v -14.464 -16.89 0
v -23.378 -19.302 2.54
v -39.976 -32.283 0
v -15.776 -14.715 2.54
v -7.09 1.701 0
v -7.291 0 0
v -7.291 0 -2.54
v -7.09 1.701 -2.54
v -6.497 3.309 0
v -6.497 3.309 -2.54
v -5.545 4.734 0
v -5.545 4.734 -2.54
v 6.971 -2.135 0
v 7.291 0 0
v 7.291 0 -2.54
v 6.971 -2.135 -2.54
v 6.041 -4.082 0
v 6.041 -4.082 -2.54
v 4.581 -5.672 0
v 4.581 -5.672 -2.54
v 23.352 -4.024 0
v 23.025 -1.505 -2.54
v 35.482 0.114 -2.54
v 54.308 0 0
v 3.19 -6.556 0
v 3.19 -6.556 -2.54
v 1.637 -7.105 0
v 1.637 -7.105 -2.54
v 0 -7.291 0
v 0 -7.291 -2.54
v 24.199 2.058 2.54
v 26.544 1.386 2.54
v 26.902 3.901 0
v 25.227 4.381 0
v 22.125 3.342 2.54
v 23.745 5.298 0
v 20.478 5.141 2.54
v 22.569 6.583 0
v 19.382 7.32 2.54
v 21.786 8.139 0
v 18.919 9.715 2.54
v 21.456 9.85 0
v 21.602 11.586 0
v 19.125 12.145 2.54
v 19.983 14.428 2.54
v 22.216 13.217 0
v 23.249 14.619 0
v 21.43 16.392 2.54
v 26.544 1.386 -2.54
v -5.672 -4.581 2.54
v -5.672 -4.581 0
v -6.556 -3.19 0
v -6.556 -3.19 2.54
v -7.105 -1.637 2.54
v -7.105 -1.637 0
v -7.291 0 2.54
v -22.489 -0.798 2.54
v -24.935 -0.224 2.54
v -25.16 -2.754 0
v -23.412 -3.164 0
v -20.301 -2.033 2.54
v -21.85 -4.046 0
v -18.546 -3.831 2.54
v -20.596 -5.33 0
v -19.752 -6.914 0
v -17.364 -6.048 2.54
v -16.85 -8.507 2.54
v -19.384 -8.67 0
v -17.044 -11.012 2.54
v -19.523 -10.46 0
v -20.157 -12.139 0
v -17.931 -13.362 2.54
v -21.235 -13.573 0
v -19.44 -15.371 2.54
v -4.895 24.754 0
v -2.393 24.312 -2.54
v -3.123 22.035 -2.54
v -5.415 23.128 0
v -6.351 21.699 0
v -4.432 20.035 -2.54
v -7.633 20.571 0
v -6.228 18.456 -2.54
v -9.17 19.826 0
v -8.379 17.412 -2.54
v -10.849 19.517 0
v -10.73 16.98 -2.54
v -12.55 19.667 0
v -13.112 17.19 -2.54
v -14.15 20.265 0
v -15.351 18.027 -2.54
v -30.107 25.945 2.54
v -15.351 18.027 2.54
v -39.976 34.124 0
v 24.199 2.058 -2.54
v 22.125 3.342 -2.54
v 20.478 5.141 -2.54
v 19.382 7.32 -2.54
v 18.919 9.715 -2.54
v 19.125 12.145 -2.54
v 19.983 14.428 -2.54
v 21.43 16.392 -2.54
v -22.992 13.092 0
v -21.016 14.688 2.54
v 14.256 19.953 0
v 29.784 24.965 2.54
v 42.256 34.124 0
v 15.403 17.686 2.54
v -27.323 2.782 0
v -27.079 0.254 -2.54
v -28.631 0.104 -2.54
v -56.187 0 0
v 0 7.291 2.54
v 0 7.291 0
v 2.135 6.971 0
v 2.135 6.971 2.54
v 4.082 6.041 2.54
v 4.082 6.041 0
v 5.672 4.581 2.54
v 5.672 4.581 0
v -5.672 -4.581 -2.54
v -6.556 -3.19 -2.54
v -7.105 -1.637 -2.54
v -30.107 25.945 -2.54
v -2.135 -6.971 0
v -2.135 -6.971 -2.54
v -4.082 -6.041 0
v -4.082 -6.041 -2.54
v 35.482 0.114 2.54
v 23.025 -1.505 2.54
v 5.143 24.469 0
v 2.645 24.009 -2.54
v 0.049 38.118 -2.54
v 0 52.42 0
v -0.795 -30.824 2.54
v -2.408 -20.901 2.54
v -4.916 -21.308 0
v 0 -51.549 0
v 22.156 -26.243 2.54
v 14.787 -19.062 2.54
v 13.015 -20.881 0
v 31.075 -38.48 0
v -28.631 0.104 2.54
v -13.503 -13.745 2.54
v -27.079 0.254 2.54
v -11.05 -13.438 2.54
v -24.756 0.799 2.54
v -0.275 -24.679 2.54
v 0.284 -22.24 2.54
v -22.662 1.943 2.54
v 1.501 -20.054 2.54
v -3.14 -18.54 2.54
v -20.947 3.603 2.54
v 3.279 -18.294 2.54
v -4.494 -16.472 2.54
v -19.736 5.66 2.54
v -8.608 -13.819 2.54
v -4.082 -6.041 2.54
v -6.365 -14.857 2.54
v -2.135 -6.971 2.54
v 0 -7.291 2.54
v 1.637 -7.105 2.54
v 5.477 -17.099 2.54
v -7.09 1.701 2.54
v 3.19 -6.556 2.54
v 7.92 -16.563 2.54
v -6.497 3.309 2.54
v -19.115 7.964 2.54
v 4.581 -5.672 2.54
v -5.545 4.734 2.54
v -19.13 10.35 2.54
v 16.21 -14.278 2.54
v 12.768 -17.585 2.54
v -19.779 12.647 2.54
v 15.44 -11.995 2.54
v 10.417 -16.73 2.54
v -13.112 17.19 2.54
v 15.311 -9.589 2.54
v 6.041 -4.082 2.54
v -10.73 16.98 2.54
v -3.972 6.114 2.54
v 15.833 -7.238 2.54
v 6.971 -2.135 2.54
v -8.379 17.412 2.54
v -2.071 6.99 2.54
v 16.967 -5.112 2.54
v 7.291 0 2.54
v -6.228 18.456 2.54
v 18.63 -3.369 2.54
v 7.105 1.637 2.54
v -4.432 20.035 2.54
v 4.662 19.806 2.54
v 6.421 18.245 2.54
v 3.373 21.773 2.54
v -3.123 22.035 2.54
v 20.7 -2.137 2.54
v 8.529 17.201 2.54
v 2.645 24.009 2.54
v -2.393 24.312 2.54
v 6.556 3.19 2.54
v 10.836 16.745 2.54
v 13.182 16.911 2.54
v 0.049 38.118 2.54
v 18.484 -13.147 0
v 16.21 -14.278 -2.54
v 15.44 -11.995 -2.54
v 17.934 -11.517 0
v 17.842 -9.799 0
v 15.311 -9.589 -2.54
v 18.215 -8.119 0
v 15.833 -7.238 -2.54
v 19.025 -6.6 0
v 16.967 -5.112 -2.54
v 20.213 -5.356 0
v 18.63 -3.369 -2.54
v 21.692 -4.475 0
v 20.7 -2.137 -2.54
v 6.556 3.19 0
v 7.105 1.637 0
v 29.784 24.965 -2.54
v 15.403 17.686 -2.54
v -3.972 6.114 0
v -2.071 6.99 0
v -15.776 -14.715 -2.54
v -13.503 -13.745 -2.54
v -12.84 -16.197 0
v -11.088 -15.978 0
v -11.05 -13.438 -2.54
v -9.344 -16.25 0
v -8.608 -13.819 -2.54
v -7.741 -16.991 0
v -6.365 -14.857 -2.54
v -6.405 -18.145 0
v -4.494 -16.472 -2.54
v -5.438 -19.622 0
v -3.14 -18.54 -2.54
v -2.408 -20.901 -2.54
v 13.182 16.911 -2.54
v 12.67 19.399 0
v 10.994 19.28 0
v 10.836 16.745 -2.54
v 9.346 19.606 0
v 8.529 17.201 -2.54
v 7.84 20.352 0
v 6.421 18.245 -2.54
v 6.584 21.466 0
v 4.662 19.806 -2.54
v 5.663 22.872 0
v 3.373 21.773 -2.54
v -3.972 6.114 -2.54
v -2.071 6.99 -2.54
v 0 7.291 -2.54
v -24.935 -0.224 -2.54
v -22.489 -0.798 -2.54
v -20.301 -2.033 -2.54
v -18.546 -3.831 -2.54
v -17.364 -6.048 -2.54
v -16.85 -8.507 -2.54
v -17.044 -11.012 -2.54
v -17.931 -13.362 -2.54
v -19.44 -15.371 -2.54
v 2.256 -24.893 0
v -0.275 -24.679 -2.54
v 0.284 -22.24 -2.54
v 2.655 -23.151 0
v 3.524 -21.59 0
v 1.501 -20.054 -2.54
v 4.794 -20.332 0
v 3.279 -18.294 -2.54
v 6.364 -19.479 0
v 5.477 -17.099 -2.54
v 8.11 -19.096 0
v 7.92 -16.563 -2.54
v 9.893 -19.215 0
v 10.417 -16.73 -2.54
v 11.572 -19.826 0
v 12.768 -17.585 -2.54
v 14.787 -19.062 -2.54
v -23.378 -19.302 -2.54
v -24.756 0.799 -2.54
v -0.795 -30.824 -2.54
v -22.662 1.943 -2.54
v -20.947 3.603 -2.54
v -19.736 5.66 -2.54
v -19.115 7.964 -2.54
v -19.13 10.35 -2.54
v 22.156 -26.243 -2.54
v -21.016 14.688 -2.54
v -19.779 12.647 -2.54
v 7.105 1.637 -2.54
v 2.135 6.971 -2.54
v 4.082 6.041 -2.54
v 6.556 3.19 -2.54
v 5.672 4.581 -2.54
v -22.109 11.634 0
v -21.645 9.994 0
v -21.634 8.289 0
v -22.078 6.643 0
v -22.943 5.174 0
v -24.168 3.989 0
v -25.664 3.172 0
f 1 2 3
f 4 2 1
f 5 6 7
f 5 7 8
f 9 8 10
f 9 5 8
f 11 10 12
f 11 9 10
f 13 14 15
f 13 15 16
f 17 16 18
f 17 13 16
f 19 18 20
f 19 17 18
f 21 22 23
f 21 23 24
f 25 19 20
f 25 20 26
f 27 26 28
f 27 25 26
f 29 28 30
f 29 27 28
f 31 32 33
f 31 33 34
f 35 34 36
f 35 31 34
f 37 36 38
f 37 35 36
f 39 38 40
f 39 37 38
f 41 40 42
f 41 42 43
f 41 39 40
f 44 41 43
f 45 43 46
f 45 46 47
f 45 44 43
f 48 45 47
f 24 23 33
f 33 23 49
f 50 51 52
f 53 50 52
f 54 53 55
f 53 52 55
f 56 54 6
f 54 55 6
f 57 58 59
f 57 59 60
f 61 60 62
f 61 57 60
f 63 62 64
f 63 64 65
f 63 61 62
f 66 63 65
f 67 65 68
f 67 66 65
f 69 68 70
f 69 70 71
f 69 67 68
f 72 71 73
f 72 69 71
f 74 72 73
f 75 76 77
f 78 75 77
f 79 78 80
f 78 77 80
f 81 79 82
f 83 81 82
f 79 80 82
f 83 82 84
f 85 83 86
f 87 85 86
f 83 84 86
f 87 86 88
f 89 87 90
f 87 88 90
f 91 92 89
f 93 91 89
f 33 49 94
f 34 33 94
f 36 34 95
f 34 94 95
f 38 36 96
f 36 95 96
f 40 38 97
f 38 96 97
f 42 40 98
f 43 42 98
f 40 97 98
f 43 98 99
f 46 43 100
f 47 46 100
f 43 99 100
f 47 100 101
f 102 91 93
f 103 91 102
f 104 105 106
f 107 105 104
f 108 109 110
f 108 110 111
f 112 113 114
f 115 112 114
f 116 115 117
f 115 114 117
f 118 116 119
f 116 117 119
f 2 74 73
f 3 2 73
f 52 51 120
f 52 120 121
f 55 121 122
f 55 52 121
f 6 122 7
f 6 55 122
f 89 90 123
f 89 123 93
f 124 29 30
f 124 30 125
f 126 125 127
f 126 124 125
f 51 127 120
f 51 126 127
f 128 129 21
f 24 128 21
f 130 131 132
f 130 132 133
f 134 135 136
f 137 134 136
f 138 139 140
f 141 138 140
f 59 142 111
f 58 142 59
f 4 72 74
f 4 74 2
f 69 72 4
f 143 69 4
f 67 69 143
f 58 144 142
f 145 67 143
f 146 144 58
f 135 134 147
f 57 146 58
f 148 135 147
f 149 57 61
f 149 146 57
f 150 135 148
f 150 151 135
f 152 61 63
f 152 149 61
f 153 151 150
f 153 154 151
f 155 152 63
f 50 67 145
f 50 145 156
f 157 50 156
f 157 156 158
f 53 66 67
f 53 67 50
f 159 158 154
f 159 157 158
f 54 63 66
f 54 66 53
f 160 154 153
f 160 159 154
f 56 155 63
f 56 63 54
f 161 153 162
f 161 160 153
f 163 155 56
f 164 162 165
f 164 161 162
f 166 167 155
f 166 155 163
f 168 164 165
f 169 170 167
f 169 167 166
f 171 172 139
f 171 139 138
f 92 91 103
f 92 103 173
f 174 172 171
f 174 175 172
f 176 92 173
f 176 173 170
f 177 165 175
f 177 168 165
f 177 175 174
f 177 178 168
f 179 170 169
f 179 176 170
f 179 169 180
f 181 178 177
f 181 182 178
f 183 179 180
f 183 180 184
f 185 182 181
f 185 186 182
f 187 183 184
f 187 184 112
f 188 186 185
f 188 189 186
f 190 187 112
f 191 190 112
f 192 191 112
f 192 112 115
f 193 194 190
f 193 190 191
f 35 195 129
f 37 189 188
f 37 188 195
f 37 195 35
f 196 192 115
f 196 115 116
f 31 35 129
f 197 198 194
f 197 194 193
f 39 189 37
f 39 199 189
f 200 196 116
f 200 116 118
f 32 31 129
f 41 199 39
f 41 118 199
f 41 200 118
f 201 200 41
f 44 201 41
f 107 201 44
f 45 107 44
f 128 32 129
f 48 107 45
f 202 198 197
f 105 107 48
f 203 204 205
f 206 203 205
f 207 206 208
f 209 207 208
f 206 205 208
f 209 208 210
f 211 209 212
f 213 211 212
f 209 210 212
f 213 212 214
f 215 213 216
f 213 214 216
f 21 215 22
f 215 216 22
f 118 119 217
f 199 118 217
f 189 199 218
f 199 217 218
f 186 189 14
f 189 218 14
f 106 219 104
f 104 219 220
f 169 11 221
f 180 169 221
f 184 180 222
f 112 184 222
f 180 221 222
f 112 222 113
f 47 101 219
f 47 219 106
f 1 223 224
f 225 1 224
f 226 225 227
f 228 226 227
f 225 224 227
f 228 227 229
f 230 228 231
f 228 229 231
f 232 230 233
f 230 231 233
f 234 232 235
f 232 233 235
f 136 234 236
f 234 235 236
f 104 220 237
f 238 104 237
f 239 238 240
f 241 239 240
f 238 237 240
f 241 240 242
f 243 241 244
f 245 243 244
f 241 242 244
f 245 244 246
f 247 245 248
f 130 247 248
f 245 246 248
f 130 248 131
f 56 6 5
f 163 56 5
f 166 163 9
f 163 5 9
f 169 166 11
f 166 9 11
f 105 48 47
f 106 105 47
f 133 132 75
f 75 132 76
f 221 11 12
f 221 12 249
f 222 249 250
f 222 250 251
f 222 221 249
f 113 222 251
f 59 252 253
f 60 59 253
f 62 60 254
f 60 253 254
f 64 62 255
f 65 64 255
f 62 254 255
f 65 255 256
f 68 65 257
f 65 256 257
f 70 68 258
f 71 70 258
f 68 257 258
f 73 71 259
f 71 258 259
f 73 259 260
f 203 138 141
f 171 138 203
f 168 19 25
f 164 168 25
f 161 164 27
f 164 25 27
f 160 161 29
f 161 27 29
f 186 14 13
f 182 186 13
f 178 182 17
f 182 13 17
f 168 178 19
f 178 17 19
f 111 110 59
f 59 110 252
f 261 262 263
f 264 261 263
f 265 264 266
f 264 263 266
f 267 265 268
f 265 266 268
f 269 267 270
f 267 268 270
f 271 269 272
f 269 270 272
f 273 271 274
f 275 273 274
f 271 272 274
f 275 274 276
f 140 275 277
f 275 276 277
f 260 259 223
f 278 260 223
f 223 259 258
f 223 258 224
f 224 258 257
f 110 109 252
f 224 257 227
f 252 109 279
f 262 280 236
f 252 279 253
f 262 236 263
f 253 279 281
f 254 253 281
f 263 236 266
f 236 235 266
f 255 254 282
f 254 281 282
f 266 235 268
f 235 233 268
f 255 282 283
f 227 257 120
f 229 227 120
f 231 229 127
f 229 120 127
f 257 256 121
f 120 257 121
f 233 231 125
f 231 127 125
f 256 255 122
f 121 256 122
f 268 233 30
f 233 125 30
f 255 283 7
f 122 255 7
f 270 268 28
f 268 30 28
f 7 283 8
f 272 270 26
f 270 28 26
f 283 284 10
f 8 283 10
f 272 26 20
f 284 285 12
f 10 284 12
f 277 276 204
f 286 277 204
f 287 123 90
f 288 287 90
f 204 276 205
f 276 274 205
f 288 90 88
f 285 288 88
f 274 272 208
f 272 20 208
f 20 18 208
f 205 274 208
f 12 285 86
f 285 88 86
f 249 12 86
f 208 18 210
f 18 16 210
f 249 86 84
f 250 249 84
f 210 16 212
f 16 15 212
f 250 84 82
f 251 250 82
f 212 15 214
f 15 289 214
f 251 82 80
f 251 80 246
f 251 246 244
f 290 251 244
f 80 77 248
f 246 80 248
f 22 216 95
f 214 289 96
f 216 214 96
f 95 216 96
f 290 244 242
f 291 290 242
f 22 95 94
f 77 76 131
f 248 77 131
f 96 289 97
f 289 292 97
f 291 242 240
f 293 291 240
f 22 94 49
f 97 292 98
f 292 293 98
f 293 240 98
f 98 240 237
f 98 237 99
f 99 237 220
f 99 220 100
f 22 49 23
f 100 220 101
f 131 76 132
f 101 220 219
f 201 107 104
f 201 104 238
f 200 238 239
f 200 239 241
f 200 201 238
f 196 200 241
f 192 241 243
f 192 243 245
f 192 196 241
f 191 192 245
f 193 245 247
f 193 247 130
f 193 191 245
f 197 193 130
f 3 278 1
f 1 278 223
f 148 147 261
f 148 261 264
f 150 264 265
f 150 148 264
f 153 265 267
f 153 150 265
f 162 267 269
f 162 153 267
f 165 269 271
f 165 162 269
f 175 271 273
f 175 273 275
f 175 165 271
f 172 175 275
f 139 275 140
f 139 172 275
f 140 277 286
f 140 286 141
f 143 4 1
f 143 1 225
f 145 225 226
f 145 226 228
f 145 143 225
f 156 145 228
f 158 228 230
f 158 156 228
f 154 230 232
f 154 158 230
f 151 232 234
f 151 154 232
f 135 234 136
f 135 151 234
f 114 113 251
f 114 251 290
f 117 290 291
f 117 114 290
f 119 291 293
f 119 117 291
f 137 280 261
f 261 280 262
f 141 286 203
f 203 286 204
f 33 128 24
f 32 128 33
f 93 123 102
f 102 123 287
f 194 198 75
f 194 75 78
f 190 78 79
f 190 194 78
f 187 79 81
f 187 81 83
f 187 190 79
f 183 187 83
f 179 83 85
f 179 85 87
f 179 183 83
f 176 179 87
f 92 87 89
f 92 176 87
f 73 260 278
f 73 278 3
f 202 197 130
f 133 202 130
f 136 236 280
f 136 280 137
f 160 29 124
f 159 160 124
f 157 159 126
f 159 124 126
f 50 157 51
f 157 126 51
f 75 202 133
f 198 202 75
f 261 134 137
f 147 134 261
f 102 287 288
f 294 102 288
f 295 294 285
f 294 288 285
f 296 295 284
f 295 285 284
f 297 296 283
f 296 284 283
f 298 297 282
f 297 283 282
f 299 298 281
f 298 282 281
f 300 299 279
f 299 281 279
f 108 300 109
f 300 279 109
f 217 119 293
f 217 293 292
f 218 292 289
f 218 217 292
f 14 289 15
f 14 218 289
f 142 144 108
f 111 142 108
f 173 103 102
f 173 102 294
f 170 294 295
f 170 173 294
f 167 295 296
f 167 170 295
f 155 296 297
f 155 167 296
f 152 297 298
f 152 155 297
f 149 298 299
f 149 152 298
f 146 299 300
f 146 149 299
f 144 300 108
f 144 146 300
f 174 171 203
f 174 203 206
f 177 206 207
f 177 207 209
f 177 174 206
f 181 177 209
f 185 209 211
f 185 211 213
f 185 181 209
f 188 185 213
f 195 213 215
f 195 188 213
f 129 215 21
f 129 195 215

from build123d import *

# Parameters (mm, degrees)
F1_DEPTH = 2.54
F2_SIZE  = 2.53999


# Not quite as in the source:
# - a fillet or chamfer is up to 0.001 mm smaller than in the source, because OpenCascade refuses the exact size


with BuildPart() as f1:
    # F0 (on Top) → F1 (new body)
    with BuildSketch(Plane.XY):
        with BuildLine():
            ThreePointArc((-5.5453096033, 4.7335261172), (-3.0532951973, 6.6207338367), (0, 7.2908660733))
            Line((0, 7.2908660733), (0, 52.4203432724))
            Line((0, 52.4203432724), (-4.8945622179, 24.7540763342))
            ThreePointArc((-4.8945622179, 24.7540763342), (-8.3763552073, 20.1468586178), (-14.1500344693, 20.2650334375))
            Line((-14.1500344693, 20.2650334375), (-39.9762034536, 34.1240465641))
            Line((-39.9762034536, 34.1240465641), (-5.5453096033, 4.7335261172))
        make_face()
        with BuildLine():
            Line((0, 52.4203432724), (0, 7.2908660733))
            ThreePointArc((0, 7.2908660733), (3.1432479122, 6.5785044395), (5.6722672278, 4.5806236032))
            Line((5.6722672278, 4.5806236032), (42.2564104309, 34.1240465641))
            Line((42.2564104309, 34.1240465641), (14.255672391, 19.9525133065))
            ThreePointArc((14.255672391, 19.9525133065), (8.5682529825, 19.9287025413), (5.1430312406, 24.46909487))
            Line((5.1430312406, 24.46909487), (0, 52.4203432724))
        make_face()
        with BuildLine():
            ThreePointArc((5.6722672278, 4.5806236032), (6.8743170129, 2.4290931856), (7.2908660733, 0))
            ThreePointArc((7.2908660733, 0), (6.5785044395, -3.1432479122), (4.5806236032, -5.6722672278))
            Line((4.5806236032, -5.6722672278), (31.0746654868, -38.4803079069))
            Line((31.0746654868, -38.4803079069), (18.4844070176, -13.1473843843))
            ThreePointArc((18.4844070176, -13.1473843843), (18.5684546903, -7.3320030677), (23.3522337103, -4.024257286))
            Line((23.3522337103, -4.024257286), (54.3080642819, 0))
            Line((54.3080642819, 0), (26.9017063995, 3.9009043758))
            ThreePointArc((26.9017063995, 3.9009043758), (21.7859881354, 8.139124947), (23.2488130784, 14.6193433195))
            Line((23.2488130784, 14.6193433195), (42.2564104309, 34.1240465641))
            Line((42.2564104309, 34.1240465641), (5.6722672278, 4.5806236032))
        make_face()
        with BuildLine():
            ThreePointArc((4.5806236032, -5.6722672278), (2.4290931856, -6.8743170129), (0, -7.2908660733))
            Line((0, -7.2908660733), (0, -51.5490919352))
            Line((0, -51.5490919352), (2.255521124, -24.8929502638))
            ThreePointArc((2.255521124, -24.8929502638), (6.3641325232, -19.4785950158), (13.0147117735, -20.8806385306))
            Line((13.0147117735, -20.8806385306), (31.0746654868, -38.4803079069))
            Line((31.0746654868, -38.4803079069), (4.5806236032, -5.6722672278))
        make_face()
        with BuildLine():
            Line((0, -51.5490919352), (0, -7.2908660733))
            ThreePointArc((0, -7.2908660733), (-3.1432479122, -6.5785044395), (-5.6722672278, -4.5806236032))
            Line((-5.6722672278, -4.5806236032), (-39.9762034536, -32.2826717697))
            Line((-39.9762034536, -32.2826717697), (-14.4636689781, -16.8901939339))
            ThreePointArc((-14.4636689781, -16.8901939339), (-8.5166009917, -16.5643608756), (-4.9155814374, -21.3084564677))
            Line((-4.9155814374, -21.3084564677), (0, -51.5490919352))
        make_face()
        with BuildLine():
            ThreePointArc((-5.6722672278, -4.5806236032), (-6.8743170129, -2.4290931856), (-7.2908660733, 0))
            Line((-7.2908660733, 0), (-13.3722843602, 0))
            Line((-13.3722843602, 0), (-56.1868394799, 0))
            Line((-56.1868394799, 0), (-25.1595931562, -2.7541493308))
            ThreePointArc((-25.1595931562, -2.7541493308), (-19.7516975402, -6.9137834915), (-21.2347588093, -13.5732444768))
            Line((-21.2347588093, -13.5732444768), (-39.9762034536, -32.2826717697))
            Line((-39.9762034536, -32.2826717697), (-5.6722672278, -4.5806236032))
        make_face()
        with BuildLine():
            Line((-13.3722843602, 0), (-7.2908660733, 0))
            ThreePointArc((-7.2908660733, 0), (-6.8405715313, 2.5225600534), (-5.5453096033, 4.7335261172))
            Line((-5.5453096033, 4.7335261172), (-39.9762034536, 34.1240465641))
            Line((-39.9762034536, 34.1240465641), (-22.9918849286, 13.0920645237))
            ThreePointArc((-22.9918849286, 13.0920645237), (-22.0777388727, 6.6432422744), (-27.3229831249, 2.7818456164))
            Line((-27.3229831249, 2.7818456164), (-56.1868394799, 0))
            Line((-56.1868394799, 0), (-13.3722843602, 0))
        make_face()
    extrude(amount=F1_DEPTH)

    # F2 (size 2.54 in the source; OpenCascade refuses exactly that, so slightly less here)
    f2_edges = [f1.edges().sort_by_distance(p)[0] for p in [
        (28.256041, 27.03828, 2.54),
        (40.604885, 1.950452, 2.54),
        (24.779536, -25.813846, 2.54),
        (22.044689, -29.680473, 2.54),
        (-2.447281, 38.58721, 2.54),
        (-31.484044, 23.608056, 2.54),
        (-30.605481, -22.927958, 2.54),
        (-2.457791, -36.428774, 2.54),
    ]]
    chamfer(f2_edges, length=F2_SIZE)

    # F3: F1 across plane


with BuildPart() as f1_1:
    add(f1.part)
    add(f1.part.mirror(Plane.XY))


solid = f1_1.part
